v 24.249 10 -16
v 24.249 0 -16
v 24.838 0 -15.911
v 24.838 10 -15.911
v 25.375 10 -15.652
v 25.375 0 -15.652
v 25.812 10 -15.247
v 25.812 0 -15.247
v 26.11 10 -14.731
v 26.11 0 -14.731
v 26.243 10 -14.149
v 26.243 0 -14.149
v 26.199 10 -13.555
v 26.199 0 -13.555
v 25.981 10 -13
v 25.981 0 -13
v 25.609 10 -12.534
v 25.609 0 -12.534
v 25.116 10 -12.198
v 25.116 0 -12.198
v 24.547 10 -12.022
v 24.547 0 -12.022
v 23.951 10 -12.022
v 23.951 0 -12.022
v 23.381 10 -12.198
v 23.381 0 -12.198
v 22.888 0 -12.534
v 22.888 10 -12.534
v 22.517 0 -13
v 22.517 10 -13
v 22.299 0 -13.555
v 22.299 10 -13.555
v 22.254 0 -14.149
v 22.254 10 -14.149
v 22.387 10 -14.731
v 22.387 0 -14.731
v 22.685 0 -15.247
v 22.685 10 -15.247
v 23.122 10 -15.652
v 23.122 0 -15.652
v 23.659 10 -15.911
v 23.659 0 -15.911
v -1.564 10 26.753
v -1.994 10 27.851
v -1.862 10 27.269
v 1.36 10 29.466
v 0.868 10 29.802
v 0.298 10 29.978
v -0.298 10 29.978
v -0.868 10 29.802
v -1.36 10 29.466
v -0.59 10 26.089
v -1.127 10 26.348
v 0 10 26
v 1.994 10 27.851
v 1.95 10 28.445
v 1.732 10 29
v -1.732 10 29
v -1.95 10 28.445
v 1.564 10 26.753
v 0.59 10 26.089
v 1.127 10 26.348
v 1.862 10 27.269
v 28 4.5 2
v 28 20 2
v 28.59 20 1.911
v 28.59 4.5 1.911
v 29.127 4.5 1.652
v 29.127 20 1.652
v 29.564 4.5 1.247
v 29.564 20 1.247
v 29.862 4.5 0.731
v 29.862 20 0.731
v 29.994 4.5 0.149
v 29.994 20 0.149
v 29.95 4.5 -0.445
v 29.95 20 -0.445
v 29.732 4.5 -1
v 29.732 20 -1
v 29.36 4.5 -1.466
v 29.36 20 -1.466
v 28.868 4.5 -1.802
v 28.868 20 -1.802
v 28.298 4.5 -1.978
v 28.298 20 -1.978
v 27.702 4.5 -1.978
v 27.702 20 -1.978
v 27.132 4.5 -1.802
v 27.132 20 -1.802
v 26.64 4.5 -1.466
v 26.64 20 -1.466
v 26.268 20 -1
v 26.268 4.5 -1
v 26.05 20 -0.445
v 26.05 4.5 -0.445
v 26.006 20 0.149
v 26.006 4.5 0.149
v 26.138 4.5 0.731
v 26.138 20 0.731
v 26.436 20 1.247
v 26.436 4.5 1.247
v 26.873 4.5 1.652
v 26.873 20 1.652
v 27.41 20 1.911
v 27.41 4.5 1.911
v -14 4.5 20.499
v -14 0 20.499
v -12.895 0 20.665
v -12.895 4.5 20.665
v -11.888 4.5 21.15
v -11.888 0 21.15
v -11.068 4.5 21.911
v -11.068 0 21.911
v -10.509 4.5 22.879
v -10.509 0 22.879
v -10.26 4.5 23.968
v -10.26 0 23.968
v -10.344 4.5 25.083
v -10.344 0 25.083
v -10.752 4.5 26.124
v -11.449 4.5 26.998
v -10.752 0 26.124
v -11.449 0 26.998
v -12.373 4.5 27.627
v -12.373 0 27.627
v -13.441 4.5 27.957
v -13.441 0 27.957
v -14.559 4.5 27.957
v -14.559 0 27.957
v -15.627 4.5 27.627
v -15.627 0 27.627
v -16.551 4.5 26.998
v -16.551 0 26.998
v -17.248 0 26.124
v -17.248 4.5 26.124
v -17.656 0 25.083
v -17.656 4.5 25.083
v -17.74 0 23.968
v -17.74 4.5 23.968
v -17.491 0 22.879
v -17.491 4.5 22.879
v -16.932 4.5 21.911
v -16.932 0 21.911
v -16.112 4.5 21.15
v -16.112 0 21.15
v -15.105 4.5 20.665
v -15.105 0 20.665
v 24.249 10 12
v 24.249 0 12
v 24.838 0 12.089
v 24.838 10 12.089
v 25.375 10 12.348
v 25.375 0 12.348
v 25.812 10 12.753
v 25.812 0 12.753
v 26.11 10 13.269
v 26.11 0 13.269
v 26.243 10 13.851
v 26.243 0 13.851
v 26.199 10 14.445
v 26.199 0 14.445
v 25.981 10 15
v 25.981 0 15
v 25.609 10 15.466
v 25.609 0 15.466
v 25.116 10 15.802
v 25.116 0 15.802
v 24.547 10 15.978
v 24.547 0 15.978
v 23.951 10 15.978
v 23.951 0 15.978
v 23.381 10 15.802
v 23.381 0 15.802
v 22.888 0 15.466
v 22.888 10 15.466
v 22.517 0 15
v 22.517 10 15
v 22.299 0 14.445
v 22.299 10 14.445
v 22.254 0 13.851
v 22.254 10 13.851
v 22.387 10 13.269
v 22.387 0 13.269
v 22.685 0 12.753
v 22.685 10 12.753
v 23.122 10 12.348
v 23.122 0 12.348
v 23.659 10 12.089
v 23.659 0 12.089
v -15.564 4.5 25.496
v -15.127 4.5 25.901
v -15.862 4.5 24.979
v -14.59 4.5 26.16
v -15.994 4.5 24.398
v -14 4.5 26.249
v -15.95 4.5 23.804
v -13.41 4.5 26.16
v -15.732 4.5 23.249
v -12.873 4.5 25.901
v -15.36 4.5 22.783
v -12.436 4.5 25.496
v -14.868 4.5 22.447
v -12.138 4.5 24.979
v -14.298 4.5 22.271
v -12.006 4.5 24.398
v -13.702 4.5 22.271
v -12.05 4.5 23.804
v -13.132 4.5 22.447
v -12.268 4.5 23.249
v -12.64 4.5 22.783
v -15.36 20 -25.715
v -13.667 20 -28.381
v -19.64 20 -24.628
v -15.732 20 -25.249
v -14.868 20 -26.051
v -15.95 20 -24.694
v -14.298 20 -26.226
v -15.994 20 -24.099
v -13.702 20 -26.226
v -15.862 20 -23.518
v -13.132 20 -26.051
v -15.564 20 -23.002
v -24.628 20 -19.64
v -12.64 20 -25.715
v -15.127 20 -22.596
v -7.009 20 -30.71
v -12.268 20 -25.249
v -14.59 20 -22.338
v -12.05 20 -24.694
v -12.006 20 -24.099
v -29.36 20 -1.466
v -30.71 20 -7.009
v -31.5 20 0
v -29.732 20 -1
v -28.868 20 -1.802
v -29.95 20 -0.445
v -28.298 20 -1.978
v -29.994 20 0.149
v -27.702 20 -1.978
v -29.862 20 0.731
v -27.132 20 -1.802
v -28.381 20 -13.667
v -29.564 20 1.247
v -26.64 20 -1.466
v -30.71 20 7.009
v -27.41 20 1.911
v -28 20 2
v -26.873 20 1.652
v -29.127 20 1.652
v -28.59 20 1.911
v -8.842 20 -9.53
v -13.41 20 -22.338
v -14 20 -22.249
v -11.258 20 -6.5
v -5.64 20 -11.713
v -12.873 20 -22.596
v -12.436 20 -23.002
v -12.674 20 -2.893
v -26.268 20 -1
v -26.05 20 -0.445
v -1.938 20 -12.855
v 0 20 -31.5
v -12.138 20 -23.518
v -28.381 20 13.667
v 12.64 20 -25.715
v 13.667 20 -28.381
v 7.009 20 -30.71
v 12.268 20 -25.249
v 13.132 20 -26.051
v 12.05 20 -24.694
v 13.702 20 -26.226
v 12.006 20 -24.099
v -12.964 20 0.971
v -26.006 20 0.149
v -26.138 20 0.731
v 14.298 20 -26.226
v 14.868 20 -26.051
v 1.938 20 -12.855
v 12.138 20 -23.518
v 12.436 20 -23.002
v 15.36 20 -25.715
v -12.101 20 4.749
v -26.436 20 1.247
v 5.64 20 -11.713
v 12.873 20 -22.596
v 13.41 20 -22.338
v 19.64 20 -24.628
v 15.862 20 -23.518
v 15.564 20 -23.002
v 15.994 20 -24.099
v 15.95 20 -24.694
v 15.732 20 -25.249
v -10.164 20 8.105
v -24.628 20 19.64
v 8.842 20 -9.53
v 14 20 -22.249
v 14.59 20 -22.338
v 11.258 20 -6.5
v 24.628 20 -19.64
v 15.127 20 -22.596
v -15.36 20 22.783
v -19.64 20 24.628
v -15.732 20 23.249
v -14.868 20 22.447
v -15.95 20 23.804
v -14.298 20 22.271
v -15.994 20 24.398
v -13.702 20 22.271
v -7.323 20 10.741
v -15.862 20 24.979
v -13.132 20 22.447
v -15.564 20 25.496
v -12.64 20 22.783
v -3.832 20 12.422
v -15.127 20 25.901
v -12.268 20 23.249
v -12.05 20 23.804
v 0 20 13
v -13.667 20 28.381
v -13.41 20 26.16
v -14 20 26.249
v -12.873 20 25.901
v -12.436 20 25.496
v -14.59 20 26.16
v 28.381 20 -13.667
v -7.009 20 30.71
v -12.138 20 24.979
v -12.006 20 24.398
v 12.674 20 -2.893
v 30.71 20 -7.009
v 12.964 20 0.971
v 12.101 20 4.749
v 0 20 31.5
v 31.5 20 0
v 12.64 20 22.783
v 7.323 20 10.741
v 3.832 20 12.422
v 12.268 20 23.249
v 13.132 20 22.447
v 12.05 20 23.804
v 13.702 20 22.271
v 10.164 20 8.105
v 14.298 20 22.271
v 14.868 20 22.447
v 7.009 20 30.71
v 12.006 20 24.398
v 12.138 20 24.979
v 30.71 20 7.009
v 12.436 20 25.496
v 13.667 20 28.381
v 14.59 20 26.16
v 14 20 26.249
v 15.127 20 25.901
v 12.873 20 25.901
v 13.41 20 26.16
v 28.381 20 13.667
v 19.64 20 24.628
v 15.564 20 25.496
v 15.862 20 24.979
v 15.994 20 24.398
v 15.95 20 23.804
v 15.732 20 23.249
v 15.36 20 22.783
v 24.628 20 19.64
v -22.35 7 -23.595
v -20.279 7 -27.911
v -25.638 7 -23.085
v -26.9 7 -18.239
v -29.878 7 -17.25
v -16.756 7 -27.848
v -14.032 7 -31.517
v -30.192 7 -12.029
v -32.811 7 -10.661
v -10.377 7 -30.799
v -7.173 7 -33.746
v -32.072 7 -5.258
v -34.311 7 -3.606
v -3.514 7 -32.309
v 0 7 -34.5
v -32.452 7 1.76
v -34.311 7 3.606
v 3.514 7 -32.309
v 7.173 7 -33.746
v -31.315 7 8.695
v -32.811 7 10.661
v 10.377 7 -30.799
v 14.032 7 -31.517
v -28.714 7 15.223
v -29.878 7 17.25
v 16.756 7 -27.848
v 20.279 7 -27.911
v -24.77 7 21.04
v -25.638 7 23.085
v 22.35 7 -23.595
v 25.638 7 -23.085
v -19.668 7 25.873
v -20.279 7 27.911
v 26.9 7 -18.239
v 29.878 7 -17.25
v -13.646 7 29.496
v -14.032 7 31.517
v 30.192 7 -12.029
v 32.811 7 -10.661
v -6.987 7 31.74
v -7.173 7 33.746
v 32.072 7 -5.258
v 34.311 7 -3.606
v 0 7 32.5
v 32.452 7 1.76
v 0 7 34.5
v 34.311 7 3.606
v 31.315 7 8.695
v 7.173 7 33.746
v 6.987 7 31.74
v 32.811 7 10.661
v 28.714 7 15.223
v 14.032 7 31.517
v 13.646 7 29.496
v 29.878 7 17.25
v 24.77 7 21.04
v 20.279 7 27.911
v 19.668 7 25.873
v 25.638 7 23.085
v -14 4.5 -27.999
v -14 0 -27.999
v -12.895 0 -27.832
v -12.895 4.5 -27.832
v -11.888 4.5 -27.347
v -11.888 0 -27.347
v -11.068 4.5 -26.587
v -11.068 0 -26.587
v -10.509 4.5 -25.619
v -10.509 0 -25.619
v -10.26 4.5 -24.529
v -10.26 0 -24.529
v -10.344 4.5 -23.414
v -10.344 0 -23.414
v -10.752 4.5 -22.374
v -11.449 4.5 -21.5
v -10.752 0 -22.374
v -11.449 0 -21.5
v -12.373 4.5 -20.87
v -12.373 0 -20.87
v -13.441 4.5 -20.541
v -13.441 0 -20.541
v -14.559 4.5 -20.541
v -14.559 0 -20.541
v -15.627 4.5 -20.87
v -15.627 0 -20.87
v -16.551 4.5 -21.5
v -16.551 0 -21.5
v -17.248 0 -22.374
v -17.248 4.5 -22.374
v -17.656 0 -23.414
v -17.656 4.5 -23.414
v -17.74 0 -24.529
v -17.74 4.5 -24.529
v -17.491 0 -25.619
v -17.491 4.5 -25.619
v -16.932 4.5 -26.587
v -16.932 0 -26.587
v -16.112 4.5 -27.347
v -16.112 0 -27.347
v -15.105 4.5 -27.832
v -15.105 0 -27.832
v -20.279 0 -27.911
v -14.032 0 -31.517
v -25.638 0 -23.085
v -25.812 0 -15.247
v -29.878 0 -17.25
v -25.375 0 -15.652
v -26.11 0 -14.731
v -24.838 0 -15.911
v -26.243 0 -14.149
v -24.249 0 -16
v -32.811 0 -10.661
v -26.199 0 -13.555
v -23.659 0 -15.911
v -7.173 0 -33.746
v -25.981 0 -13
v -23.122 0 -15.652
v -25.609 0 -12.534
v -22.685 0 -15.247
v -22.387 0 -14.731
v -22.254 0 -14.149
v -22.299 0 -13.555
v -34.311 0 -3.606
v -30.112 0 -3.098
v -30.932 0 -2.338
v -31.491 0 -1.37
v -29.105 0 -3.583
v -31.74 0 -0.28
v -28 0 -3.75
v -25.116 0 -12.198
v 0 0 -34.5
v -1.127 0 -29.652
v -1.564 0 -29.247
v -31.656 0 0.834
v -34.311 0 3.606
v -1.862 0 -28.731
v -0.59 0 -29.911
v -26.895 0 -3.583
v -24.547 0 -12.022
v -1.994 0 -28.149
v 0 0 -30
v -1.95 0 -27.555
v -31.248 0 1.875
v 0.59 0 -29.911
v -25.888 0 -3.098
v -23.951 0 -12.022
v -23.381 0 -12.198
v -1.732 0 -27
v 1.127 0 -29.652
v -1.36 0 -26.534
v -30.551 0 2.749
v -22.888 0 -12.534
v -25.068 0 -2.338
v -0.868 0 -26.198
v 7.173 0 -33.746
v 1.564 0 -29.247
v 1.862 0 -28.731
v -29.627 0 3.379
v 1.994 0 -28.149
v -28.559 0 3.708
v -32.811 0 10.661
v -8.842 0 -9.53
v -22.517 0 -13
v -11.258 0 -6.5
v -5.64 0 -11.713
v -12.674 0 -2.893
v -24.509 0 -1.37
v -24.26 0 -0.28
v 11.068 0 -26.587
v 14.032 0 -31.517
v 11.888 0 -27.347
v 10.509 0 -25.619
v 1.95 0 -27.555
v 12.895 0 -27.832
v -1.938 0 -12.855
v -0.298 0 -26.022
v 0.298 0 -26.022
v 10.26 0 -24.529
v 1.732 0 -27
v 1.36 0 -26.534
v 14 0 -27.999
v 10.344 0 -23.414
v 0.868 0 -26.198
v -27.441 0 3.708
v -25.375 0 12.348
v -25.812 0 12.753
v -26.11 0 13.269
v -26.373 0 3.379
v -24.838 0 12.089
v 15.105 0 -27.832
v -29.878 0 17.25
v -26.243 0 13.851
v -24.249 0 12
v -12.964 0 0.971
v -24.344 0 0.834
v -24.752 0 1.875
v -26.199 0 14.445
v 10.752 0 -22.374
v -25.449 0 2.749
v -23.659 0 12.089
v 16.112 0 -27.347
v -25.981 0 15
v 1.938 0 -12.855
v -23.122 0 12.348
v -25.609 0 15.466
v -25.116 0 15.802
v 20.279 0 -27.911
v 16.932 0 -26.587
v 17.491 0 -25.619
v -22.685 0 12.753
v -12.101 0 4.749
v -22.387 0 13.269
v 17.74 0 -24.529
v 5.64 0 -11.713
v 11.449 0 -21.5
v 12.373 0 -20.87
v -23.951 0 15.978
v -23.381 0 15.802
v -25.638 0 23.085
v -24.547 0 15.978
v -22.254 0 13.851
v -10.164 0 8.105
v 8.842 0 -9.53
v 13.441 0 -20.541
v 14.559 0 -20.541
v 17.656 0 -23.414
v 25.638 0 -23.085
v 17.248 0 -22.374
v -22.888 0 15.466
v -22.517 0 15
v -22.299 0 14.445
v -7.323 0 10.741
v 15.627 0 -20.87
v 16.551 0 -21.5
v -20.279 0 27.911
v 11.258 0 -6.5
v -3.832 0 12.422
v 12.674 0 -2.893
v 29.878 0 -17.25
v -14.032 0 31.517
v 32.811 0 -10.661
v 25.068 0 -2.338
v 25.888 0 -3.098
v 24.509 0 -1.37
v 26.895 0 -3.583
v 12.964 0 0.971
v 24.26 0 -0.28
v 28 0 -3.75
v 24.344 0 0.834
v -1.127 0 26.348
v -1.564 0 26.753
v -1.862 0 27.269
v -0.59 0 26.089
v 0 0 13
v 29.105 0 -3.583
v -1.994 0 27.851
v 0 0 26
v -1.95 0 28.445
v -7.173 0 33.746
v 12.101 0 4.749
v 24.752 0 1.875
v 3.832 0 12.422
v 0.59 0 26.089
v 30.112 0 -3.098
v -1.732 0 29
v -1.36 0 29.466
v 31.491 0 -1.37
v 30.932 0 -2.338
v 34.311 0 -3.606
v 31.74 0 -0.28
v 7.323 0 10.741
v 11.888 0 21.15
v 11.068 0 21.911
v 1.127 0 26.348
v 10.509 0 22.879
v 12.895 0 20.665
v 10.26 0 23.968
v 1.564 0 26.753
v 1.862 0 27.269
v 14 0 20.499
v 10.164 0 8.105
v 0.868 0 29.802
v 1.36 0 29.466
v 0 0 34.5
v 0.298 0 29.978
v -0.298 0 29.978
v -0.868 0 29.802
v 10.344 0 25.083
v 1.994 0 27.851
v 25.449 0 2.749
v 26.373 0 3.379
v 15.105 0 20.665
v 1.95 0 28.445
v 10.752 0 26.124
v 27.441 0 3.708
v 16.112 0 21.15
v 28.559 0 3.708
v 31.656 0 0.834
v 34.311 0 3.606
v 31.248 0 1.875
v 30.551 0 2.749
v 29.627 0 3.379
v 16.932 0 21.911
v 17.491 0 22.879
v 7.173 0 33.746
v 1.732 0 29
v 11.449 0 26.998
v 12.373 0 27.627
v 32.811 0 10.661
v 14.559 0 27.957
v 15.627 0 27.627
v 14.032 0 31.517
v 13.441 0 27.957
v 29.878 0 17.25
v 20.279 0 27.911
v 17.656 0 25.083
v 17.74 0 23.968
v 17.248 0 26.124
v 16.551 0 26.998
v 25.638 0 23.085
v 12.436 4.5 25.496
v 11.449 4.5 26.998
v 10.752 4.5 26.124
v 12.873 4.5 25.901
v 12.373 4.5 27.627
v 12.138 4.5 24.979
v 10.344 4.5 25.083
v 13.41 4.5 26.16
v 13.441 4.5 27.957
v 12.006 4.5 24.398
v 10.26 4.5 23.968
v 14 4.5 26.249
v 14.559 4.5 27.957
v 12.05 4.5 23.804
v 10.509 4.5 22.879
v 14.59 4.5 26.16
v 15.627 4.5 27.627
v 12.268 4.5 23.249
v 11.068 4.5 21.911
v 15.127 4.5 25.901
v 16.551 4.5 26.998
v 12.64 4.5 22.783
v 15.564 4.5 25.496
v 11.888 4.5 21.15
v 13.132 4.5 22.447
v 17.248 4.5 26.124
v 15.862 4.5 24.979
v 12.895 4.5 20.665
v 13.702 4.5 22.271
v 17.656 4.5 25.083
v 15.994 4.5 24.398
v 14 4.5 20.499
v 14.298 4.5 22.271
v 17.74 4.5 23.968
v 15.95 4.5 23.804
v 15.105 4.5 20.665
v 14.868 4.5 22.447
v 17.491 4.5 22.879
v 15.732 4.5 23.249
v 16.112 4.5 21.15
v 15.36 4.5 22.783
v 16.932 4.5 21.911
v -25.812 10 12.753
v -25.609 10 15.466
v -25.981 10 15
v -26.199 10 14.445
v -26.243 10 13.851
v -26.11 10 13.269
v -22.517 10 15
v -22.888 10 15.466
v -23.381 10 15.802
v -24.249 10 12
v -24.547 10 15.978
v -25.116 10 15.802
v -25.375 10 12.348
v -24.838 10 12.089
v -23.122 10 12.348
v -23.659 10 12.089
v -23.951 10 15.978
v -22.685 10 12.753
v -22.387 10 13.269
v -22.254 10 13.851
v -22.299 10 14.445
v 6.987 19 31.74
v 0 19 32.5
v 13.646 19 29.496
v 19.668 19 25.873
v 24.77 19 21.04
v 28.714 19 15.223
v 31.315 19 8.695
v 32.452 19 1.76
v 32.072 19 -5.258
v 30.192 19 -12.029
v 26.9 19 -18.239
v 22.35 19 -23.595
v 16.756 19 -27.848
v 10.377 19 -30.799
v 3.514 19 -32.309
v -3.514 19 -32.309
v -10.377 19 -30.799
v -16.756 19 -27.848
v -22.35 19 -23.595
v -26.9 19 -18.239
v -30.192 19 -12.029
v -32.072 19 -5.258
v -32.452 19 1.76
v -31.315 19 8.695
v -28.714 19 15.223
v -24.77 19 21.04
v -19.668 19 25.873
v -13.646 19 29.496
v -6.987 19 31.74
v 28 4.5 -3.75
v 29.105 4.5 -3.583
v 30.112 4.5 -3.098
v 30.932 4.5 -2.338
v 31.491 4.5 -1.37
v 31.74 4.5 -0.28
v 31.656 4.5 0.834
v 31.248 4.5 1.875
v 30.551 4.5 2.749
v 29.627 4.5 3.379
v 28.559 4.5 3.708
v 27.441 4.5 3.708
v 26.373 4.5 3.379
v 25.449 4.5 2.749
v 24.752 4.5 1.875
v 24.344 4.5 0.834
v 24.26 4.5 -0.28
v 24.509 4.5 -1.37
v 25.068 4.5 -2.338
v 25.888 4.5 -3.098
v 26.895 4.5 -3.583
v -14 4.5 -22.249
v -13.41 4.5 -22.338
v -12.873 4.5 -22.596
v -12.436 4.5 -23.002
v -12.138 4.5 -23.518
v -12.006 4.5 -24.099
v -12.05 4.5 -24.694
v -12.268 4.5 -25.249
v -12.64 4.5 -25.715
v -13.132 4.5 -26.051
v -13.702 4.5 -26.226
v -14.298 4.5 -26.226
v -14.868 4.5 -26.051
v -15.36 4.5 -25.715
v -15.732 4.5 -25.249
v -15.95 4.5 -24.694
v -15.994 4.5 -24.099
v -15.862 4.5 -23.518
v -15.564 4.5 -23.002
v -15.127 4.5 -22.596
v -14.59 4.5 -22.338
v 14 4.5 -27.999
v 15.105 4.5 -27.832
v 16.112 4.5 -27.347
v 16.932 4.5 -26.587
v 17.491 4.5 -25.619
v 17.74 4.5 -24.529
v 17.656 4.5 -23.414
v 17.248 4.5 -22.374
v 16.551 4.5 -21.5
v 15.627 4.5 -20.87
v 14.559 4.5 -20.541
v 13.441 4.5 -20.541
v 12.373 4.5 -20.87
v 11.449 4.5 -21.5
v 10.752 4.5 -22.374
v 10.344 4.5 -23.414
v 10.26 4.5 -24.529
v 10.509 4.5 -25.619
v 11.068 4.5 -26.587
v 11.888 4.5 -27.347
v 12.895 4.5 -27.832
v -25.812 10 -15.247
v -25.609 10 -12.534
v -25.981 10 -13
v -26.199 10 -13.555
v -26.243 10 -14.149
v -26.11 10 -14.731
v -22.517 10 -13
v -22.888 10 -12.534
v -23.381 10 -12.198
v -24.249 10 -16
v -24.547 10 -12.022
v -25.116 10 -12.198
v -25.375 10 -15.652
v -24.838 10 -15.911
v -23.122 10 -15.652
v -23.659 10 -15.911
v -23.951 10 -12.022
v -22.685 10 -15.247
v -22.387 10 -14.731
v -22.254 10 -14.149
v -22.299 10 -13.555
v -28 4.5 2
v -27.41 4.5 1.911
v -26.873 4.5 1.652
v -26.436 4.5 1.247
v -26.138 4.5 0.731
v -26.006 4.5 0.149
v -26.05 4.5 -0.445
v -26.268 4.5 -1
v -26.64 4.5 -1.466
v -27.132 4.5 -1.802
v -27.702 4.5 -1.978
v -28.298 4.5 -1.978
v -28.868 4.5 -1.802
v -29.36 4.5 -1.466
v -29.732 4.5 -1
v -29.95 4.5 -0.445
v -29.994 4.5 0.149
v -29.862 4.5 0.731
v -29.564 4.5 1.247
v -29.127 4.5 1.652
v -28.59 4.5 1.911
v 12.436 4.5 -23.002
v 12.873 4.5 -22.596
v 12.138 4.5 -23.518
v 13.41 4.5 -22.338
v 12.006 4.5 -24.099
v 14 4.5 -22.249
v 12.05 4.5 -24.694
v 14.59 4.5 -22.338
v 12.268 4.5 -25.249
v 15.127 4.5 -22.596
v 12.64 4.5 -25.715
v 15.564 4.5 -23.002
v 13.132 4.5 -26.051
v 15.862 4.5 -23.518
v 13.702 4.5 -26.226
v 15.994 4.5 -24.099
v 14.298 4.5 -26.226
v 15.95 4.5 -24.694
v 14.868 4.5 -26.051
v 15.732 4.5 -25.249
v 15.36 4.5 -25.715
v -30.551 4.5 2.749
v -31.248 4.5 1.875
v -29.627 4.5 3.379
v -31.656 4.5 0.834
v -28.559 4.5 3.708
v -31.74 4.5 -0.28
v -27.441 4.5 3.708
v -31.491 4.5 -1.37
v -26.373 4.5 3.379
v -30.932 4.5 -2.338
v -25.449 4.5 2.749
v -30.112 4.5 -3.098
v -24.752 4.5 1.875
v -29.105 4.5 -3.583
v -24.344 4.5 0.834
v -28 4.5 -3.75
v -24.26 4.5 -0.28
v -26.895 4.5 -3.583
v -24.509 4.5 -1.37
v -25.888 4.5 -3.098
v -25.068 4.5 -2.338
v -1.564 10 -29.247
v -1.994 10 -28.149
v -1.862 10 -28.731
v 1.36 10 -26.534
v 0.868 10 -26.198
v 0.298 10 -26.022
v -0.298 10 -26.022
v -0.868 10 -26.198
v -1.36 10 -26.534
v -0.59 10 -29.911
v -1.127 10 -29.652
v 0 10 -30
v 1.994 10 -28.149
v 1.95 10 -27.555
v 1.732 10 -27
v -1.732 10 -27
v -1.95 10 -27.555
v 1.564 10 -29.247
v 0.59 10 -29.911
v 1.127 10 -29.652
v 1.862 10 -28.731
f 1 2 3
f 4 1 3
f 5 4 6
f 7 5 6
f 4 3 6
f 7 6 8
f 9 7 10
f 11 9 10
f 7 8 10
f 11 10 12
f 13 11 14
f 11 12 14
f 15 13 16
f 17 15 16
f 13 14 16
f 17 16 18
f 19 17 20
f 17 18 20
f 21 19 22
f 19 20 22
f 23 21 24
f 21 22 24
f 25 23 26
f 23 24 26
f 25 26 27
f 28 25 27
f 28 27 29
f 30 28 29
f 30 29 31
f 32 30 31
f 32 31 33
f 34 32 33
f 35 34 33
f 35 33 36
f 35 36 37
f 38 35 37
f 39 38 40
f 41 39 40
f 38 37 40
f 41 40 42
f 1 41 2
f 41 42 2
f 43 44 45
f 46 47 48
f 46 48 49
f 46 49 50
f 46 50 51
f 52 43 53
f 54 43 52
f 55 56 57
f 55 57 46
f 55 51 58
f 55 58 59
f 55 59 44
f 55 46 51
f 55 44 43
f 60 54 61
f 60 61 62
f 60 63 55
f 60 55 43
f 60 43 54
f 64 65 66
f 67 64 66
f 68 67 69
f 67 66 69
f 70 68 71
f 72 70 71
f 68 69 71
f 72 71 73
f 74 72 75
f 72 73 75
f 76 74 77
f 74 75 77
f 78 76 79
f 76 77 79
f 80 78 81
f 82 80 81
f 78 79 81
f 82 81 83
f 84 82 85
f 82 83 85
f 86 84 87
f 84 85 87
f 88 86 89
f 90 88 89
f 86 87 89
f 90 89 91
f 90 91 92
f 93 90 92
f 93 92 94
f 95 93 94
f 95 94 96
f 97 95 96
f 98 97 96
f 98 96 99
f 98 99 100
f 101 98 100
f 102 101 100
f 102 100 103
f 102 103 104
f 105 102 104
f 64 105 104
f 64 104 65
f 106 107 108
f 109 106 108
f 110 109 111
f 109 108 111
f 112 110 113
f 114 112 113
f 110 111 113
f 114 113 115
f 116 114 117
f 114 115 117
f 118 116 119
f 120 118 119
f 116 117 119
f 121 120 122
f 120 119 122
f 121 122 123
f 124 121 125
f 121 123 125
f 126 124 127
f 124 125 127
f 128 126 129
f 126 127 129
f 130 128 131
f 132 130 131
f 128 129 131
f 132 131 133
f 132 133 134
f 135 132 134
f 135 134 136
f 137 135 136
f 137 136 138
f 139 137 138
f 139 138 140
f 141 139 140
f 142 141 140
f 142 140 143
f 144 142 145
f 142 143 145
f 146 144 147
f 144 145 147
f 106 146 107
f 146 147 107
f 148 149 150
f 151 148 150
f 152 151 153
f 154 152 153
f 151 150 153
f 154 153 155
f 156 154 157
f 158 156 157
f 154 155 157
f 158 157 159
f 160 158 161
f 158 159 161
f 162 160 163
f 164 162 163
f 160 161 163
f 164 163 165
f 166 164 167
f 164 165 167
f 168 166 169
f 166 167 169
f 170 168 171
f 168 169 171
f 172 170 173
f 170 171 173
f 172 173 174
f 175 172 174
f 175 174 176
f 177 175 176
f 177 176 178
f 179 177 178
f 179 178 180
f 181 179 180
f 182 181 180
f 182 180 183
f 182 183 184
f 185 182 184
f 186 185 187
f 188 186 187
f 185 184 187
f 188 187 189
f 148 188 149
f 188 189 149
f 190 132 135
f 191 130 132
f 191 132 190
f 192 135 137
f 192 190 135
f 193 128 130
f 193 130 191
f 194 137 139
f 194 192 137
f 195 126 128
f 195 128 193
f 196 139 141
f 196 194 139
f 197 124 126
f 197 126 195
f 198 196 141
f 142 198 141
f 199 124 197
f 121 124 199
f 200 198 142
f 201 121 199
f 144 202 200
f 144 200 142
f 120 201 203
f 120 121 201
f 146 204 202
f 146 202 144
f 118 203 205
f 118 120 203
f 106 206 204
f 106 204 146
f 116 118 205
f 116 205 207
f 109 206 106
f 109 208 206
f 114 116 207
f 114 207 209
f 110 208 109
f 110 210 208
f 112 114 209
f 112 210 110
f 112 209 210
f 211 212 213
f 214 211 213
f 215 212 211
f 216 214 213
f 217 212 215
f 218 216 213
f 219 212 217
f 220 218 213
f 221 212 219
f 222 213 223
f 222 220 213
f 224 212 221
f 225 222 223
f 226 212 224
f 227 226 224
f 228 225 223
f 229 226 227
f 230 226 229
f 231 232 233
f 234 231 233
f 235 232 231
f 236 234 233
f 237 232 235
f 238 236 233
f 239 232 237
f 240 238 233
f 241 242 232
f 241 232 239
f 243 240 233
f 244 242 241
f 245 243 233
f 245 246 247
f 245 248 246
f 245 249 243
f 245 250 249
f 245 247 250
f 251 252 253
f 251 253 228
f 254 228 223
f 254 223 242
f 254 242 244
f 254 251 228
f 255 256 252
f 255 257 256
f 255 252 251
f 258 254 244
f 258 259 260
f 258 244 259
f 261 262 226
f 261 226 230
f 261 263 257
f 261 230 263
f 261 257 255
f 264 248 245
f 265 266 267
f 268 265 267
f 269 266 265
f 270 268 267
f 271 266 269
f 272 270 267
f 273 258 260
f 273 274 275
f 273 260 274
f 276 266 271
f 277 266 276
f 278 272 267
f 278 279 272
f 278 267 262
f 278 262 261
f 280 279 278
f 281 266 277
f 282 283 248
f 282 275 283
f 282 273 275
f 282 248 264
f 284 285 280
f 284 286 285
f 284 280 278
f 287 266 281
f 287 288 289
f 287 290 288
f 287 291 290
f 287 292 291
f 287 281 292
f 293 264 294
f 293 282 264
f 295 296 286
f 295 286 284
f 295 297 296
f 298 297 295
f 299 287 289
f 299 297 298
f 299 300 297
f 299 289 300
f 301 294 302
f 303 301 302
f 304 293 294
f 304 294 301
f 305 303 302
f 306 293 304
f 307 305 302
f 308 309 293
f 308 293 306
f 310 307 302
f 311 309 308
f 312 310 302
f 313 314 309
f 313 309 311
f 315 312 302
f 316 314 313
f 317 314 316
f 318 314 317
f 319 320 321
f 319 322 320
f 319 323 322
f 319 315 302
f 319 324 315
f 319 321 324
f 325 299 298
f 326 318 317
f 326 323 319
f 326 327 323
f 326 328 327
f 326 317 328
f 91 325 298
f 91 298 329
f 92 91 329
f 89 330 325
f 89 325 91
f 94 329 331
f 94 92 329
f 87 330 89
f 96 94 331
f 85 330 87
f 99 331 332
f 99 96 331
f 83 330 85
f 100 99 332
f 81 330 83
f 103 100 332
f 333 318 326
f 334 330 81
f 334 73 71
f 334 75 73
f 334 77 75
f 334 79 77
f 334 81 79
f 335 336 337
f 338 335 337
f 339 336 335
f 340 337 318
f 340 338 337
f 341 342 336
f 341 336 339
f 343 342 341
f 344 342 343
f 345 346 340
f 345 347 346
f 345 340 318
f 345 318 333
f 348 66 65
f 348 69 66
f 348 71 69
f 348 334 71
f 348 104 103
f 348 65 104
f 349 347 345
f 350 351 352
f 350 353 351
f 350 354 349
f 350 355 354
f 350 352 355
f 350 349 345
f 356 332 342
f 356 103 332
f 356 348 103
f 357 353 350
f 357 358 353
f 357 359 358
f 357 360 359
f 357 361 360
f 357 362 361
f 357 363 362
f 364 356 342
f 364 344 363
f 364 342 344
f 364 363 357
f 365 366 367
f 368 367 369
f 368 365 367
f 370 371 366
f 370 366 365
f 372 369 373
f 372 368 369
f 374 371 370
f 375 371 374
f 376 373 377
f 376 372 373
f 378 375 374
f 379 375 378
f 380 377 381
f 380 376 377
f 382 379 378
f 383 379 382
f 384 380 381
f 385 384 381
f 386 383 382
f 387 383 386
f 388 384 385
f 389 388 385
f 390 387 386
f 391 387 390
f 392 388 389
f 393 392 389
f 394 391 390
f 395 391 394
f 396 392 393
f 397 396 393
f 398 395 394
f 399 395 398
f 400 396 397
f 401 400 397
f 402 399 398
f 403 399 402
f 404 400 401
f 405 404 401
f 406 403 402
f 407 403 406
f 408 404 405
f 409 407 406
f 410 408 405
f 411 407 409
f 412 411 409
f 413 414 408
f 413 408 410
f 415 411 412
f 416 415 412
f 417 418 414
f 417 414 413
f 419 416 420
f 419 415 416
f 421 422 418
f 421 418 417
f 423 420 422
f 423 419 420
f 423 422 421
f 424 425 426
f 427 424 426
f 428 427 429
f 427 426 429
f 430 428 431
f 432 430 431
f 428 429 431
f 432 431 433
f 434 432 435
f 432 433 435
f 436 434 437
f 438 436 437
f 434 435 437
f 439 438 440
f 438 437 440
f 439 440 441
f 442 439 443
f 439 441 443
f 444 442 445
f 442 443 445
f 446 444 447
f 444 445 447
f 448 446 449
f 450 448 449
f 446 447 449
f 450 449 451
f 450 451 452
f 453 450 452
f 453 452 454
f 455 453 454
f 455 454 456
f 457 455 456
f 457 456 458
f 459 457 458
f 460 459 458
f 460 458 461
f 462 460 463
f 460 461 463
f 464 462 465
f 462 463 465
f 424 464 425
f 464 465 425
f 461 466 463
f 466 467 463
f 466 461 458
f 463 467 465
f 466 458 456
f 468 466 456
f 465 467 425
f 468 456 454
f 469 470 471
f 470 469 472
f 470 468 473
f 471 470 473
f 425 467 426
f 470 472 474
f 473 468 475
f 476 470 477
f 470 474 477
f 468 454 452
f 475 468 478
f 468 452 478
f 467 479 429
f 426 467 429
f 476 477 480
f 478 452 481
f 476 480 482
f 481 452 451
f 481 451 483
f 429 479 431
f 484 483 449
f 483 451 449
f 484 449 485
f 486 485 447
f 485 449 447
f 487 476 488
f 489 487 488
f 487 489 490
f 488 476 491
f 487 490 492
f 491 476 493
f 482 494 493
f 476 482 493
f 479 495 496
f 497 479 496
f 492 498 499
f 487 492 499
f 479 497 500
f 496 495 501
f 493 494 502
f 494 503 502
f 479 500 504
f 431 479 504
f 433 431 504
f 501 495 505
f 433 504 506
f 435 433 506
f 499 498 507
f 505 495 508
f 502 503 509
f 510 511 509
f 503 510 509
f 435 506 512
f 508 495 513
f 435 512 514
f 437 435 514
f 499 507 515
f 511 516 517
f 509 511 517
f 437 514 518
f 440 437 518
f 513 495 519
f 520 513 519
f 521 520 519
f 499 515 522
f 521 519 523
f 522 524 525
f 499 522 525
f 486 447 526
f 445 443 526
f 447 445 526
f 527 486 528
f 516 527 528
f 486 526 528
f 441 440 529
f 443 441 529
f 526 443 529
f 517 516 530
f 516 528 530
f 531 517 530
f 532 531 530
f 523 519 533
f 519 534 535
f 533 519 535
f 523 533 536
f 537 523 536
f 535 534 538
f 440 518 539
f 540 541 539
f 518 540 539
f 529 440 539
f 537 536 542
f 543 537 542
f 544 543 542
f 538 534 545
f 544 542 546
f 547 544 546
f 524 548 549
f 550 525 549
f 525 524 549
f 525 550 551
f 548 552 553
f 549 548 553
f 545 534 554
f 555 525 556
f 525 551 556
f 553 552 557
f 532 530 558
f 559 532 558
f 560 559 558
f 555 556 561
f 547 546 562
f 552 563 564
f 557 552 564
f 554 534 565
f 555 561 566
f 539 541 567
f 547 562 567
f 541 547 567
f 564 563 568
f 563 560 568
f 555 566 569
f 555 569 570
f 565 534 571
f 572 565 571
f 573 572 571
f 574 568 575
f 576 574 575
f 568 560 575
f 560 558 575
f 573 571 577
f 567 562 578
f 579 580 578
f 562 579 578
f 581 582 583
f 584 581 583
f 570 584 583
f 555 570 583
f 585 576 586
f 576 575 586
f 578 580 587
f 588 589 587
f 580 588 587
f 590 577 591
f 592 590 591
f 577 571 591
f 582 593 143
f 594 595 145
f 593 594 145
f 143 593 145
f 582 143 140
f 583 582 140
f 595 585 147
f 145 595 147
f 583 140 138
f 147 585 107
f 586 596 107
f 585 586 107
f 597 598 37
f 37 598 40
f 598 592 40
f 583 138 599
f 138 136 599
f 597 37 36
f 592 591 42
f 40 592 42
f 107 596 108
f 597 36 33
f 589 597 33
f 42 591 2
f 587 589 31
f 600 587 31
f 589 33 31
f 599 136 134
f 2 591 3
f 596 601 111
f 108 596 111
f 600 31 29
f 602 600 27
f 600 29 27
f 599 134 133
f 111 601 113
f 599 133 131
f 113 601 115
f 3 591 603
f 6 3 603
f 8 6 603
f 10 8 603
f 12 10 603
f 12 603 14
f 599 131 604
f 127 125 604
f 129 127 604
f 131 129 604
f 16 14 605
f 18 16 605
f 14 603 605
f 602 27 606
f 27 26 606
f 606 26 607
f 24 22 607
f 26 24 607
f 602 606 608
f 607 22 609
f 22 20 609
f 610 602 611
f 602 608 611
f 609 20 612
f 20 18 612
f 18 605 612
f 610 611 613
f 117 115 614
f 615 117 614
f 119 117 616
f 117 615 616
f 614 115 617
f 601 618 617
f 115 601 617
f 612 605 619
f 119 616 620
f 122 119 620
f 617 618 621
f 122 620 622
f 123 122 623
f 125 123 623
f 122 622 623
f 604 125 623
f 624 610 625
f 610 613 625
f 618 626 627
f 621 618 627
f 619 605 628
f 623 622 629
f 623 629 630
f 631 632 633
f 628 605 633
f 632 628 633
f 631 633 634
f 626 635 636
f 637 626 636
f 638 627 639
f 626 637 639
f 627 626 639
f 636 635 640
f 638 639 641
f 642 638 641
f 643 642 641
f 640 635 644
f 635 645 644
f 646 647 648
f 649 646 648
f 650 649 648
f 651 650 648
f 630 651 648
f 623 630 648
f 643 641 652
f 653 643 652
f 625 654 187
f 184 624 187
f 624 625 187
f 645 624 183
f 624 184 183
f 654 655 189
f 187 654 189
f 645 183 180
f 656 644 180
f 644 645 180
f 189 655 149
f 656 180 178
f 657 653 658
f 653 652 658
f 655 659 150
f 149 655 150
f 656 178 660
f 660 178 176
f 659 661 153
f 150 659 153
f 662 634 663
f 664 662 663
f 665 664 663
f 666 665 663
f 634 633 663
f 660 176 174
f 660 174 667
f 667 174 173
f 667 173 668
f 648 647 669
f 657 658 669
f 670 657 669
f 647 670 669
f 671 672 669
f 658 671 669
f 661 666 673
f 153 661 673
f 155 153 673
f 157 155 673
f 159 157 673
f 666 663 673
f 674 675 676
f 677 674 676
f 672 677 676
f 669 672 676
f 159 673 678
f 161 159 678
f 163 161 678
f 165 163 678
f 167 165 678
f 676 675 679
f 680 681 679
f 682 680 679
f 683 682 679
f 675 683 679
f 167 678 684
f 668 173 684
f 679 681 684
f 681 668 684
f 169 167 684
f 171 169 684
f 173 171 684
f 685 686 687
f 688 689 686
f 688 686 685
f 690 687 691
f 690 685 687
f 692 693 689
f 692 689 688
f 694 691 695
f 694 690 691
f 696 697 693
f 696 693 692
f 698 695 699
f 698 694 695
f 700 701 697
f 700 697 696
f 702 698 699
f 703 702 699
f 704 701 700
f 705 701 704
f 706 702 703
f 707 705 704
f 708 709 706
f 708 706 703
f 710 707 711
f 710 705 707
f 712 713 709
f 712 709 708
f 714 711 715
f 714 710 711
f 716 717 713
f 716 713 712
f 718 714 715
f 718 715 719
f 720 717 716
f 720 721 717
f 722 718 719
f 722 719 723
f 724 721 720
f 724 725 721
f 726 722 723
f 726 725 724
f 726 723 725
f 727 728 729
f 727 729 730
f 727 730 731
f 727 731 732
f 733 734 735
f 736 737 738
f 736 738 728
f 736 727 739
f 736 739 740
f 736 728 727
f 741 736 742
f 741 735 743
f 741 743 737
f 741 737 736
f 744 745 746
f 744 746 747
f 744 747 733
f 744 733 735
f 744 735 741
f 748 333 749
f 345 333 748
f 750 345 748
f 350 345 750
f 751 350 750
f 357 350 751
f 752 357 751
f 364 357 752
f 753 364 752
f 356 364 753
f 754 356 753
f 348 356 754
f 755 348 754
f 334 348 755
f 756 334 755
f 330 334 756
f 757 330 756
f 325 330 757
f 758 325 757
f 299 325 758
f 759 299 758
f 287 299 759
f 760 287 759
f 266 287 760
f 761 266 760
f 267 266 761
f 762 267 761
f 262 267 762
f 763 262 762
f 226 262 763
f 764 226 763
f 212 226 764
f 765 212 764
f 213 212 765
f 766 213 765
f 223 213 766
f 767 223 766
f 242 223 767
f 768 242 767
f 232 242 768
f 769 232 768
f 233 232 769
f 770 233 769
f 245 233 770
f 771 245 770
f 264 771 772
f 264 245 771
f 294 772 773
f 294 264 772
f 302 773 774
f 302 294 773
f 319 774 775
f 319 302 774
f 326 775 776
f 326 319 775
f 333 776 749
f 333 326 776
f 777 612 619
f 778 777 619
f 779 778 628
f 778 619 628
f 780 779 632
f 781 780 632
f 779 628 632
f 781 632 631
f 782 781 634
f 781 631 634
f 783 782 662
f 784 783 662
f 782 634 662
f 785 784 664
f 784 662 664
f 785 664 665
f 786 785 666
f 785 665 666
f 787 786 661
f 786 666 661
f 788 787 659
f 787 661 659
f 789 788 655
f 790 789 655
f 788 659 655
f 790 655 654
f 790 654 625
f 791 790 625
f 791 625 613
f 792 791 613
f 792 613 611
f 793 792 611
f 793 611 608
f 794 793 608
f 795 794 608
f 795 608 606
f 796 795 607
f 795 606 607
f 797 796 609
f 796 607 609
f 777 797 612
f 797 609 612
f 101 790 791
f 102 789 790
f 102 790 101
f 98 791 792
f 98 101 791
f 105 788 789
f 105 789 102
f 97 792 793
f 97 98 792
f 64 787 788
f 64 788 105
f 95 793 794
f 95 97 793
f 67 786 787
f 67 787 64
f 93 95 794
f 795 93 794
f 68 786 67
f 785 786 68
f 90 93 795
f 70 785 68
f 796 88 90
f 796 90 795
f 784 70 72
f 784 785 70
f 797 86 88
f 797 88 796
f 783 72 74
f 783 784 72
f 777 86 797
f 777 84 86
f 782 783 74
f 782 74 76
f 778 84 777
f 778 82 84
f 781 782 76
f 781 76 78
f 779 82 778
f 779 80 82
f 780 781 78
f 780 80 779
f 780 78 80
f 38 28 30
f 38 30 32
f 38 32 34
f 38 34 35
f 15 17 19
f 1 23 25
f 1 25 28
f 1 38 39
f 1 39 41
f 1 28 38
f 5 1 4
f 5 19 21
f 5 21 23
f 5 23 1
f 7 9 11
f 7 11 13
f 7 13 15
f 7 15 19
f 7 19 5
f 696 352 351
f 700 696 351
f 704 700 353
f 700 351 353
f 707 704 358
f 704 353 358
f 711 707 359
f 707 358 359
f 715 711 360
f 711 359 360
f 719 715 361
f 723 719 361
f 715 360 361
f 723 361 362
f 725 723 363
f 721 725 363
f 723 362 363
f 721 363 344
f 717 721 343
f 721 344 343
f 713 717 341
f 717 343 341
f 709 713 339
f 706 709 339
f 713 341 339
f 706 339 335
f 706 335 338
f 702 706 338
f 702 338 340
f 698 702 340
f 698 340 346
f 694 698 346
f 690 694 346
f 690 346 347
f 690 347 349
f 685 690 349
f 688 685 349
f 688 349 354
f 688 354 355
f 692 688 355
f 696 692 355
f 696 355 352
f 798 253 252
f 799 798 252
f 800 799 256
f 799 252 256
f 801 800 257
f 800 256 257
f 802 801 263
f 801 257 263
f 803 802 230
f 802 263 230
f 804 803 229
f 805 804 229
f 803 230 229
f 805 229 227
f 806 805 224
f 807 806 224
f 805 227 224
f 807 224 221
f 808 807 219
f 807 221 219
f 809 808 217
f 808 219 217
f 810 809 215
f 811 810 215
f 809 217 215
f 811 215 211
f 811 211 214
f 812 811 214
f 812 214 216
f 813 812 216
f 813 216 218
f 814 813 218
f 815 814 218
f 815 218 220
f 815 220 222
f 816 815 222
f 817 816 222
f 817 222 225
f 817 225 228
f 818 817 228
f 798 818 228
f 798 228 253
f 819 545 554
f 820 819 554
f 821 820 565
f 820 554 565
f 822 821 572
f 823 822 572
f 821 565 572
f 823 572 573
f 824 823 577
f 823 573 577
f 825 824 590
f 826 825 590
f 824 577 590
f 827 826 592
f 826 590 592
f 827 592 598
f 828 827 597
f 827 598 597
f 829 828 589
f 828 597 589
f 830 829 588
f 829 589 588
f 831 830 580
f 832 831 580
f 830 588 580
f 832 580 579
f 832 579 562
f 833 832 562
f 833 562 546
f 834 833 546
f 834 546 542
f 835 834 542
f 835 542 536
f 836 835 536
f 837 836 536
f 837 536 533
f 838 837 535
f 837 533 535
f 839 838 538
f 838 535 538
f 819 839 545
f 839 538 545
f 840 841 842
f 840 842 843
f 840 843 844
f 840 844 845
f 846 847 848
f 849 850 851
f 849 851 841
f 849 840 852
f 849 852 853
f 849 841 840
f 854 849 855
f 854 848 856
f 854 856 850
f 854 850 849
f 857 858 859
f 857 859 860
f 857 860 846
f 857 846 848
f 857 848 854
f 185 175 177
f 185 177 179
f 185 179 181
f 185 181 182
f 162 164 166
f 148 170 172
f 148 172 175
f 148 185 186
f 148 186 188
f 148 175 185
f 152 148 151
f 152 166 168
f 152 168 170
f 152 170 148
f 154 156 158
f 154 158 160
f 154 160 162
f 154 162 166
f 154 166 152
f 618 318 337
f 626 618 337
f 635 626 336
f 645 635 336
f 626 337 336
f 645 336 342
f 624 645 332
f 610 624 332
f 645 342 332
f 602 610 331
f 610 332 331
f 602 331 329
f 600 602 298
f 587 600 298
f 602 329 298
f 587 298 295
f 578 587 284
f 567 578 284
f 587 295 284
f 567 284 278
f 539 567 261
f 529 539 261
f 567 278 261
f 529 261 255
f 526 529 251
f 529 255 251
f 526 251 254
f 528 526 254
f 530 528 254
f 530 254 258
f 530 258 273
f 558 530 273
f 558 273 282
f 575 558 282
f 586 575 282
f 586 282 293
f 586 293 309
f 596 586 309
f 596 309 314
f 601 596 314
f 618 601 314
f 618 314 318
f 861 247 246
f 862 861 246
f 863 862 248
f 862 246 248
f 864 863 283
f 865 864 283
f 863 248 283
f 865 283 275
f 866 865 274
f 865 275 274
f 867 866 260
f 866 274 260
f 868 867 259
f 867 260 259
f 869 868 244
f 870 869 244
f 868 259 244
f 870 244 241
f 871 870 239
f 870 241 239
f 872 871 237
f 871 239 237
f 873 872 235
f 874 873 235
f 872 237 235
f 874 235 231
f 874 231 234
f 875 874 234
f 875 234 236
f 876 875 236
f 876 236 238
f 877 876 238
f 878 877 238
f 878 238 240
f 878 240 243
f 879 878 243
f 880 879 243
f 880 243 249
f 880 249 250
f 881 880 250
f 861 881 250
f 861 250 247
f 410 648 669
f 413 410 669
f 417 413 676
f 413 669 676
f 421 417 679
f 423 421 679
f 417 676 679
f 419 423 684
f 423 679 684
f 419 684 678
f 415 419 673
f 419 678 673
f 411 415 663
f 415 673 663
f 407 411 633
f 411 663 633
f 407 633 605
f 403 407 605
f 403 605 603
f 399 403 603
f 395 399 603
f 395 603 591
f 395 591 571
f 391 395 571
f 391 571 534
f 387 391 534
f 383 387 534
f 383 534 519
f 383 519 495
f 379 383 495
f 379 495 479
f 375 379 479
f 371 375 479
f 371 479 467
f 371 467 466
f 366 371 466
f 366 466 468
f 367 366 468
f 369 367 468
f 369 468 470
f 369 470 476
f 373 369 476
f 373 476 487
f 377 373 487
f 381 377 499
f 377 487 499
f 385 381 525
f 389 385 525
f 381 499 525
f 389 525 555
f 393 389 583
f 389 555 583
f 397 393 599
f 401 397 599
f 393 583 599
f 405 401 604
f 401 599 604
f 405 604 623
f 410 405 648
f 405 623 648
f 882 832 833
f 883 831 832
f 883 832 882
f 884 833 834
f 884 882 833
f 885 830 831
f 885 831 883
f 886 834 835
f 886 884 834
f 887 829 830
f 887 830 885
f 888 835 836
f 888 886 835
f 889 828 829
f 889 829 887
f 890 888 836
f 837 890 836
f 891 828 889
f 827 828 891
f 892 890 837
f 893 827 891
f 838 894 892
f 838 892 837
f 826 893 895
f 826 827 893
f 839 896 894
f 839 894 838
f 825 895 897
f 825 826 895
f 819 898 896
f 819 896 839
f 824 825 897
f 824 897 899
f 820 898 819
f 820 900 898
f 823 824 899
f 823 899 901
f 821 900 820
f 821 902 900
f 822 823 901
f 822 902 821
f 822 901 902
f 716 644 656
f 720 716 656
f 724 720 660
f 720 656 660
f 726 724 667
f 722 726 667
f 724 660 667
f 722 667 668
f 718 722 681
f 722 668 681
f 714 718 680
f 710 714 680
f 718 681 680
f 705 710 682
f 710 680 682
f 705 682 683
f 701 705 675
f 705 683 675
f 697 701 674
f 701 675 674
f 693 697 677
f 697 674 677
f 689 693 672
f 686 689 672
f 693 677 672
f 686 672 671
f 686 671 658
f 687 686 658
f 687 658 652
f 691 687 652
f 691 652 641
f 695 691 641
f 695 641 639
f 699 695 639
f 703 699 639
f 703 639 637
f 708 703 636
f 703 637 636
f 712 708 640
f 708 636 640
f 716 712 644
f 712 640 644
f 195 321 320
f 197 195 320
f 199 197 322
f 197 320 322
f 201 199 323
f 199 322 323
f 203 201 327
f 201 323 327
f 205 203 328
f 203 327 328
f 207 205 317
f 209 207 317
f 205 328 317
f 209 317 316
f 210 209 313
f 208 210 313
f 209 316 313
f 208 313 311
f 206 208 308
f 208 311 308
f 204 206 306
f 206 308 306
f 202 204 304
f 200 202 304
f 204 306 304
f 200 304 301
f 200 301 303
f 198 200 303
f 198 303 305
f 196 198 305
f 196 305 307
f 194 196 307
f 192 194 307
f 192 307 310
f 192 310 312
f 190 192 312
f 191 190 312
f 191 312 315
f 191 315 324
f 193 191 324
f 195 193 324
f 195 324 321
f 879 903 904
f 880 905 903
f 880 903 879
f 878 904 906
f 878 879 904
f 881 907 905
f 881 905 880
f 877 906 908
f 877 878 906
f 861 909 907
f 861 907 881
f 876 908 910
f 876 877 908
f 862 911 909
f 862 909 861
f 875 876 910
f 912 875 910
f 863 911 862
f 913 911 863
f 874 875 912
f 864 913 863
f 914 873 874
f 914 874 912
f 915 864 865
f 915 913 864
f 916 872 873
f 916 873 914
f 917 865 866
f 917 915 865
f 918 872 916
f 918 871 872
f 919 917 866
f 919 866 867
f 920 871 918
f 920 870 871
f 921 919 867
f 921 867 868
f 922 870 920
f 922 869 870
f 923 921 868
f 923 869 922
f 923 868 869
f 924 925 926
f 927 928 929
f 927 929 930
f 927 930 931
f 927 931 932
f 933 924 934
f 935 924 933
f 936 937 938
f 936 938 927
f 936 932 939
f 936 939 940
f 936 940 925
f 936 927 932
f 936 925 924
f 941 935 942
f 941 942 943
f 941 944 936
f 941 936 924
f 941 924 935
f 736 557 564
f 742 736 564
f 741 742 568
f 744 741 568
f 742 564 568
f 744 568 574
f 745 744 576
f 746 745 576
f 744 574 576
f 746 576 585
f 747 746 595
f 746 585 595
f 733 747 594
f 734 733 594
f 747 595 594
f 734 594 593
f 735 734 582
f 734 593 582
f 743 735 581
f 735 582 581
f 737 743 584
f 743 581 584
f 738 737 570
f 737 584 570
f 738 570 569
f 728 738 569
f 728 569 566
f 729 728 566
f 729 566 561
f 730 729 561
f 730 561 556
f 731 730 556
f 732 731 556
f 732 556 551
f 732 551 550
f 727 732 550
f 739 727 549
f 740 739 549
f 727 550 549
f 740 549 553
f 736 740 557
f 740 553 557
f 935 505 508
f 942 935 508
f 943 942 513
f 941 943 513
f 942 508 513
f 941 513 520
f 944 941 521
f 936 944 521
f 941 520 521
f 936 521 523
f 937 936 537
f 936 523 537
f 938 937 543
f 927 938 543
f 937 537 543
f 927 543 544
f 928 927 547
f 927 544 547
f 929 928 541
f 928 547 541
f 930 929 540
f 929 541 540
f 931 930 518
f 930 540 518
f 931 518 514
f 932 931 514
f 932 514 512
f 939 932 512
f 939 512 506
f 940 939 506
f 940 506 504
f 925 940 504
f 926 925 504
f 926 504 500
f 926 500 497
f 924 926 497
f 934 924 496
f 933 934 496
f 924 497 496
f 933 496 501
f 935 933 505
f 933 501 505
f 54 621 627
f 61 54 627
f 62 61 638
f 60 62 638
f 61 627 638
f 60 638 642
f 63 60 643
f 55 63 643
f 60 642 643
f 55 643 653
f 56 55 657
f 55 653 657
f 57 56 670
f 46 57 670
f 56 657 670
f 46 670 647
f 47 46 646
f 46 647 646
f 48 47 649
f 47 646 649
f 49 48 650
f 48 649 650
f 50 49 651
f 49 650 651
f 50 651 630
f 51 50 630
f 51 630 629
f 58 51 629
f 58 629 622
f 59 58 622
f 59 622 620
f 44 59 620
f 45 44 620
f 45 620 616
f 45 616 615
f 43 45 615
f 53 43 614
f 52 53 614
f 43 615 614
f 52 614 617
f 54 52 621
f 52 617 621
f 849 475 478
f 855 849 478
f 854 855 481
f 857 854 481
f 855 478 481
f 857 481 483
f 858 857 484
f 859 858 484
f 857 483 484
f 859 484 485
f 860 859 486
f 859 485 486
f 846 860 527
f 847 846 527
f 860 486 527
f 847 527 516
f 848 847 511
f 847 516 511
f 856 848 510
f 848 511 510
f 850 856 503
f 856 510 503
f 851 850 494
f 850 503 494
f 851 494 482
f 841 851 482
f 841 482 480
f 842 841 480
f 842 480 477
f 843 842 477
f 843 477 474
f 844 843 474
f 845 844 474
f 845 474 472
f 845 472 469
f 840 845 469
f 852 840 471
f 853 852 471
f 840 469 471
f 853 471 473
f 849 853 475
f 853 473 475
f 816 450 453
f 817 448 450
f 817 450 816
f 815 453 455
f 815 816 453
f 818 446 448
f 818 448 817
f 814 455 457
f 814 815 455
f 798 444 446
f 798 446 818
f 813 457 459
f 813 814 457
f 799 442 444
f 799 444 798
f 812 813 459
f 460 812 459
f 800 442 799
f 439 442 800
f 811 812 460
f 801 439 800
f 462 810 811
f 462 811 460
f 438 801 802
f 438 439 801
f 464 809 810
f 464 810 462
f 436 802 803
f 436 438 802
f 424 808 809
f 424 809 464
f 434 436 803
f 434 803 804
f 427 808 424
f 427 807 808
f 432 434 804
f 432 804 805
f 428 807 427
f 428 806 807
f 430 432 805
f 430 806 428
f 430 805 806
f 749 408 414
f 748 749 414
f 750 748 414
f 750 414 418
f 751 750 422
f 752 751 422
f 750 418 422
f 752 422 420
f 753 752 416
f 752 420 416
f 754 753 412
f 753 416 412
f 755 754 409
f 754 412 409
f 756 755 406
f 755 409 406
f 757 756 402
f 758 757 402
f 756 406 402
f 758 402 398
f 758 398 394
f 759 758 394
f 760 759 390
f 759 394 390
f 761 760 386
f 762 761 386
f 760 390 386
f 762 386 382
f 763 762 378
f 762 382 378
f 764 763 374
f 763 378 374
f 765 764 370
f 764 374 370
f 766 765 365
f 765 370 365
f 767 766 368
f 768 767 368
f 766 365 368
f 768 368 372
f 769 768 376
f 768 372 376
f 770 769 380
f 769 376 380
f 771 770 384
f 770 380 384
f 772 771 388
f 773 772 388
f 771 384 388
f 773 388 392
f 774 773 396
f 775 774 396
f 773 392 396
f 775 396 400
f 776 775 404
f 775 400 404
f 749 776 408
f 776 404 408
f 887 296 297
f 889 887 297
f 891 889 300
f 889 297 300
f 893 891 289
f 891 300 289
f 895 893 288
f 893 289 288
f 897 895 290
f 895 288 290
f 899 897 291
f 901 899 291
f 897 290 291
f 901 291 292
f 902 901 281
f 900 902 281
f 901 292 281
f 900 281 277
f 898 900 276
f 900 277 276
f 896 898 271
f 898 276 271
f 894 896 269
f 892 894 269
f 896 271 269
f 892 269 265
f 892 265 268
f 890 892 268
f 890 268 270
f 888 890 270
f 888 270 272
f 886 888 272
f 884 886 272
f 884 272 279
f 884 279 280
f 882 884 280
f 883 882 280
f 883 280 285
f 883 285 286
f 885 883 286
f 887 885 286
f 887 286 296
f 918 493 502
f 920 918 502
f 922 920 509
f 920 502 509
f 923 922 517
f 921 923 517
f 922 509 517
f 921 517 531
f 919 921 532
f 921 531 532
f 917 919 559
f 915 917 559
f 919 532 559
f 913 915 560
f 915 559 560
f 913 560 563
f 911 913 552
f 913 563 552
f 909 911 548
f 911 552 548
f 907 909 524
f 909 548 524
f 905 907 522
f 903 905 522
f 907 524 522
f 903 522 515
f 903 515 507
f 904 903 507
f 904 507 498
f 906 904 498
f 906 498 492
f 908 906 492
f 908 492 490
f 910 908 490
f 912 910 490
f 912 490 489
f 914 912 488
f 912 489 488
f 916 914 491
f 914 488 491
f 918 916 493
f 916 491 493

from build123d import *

# Parameters (mm, degrees)
SKETCH_1_R          = 34.5
EXTRUDE_1_DEPTH     = 20
CUT_EXTRUDE_START   = -13
SKETCH_2_R          = 34.5
SKETCH_2_R_2        = 32.5
CUT_EXTRUDE_1_DEPTH = 13
SKETCH_3_R          = 2
CUT_EXTRUDE_3_DEPTH = 53.730446613
SKETCH_7_R          = 13
CUT_EXTRUDE_6_DEPTH = 53.730446613
SKETCH_8_R          = 3.75
CUT_EXTRUDE_7_DEPTH = 4.5
CHAMFER_4_SIZE      = 1
SKETCH_9_R          = 2
CUT_EXTRUDE_8_DEPTH = 10


with BuildPart() as part:
    # 草图1 → 凸台-拉伸1 (new body)
    with BuildSketch(Plane(origin=(0, 0, 0), x_dir=(1, 0, 0), z_dir=(0, 1, 0))):
        Circle(SKETCH_1_R)
    extrude(amount=EXTRUDE_1_DEPTH)

    # 草图2 → 切除-拉伸1 (cut)
    with BuildSketch(Plane(origin=(0, 20, 0), x_dir=(1, 0, 0), z_dir=(0, 1, 0)).offset(CUT_EXTRUDE_START)):
        Circle(SKETCH_2_R)
        Circle(SKETCH_2_R_2, mode=Mode.SUBTRACT)
    extrude(amount=CUT_EXTRUDE_1_DEPTH, mode=Mode.SUBTRACT)

    # 草图3 → 切除-拉伸3 (cut, through all)
    with BuildSketch(Plane(origin=(0, 20, 0), x_dir=(1, 0, 0), z_dir=(0, 1, 0))):
        with Locations((-28, 0)):
            Circle(SKETCH_3_R)
        with Locations((-14, 24.248711306)):
            Circle(SKETCH_3_R)
        with Locations((14, 24.248711306)):
            Circle(SKETCH_3_R)
        with Locations((28, 0)):
            Circle(SKETCH_3_R)
        with Locations((14, -24.248711306)):
            Circle(SKETCH_3_R)
        with Locations((-14, -24.248711306)):
            Circle(SKETCH_3_R)
    extrude(amount=-CUT_EXTRUDE_3_DEPTH, mode=Mode.SUBTRACT)

    # 草图7 → 切除-拉伸6 (cut, through all)
    with BuildSketch(Plane(origin=(0, 20, 0), x_dir=(1, 0, 0), z_dir=(0, 1, 0))):
        Circle(SKETCH_7_R)
    extrude(amount=-CUT_EXTRUDE_6_DEPTH, mode=Mode.SUBTRACT)

    # 草图8 → 切除-拉伸7 (cut)
    with BuildSketch(Plane.XZ):
        with Locations((-28, 0)):
            Circle(SKETCH_8_R)
        with Locations((-14, 24.248711306)):
            Circle(SKETCH_8_R)
        with Locations((14, 24.248711306)):
            Circle(SKETCH_8_R)
        with Locations((28, 0)):
            Circle(SKETCH_8_R)
        with Locations((14, -24.248711306)):
            Circle(SKETCH_8_R)
        with Locations((-14, -24.248711306)):
            Circle(SKETCH_8_R)
    extrude(amount=-CUT_EXTRUDE_7_DEPTH, mode=Mode.SUBTRACT)

    # 倒角4
    chamfer_4_edges = [part.edges().sort_by_distance(p)[0] for p in [
        (-32.5, 20, 0),
    ]]
    chamfer(chamfer_4_edges, length=CHAMFER_4_SIZE)

    # 草图9 → 切除-拉伸8 (cut)
    with BuildSketch(Plane.XZ):
        with Locations((0, 28)):
            Circle(SKETCH_9_R)
        with Locations((24.248711306, 14)):
            Circle(SKETCH_9_R)
        with Locations((24.248711306, -14)):
            Circle(SKETCH_9_R)
        with Locations((0, -28)):
            Circle(SKETCH_9_R)
        with Locations((-24.248711306, -14)):
            Circle(SKETCH_9_R)
        with Locations((-24.248711306, 14)):
            Circle(SKETCH_9_R)
    extrude(amount=-CUT_EXTRUDE_8_DEPTH, mode=Mode.SUBTRACT)


solid = part.part
